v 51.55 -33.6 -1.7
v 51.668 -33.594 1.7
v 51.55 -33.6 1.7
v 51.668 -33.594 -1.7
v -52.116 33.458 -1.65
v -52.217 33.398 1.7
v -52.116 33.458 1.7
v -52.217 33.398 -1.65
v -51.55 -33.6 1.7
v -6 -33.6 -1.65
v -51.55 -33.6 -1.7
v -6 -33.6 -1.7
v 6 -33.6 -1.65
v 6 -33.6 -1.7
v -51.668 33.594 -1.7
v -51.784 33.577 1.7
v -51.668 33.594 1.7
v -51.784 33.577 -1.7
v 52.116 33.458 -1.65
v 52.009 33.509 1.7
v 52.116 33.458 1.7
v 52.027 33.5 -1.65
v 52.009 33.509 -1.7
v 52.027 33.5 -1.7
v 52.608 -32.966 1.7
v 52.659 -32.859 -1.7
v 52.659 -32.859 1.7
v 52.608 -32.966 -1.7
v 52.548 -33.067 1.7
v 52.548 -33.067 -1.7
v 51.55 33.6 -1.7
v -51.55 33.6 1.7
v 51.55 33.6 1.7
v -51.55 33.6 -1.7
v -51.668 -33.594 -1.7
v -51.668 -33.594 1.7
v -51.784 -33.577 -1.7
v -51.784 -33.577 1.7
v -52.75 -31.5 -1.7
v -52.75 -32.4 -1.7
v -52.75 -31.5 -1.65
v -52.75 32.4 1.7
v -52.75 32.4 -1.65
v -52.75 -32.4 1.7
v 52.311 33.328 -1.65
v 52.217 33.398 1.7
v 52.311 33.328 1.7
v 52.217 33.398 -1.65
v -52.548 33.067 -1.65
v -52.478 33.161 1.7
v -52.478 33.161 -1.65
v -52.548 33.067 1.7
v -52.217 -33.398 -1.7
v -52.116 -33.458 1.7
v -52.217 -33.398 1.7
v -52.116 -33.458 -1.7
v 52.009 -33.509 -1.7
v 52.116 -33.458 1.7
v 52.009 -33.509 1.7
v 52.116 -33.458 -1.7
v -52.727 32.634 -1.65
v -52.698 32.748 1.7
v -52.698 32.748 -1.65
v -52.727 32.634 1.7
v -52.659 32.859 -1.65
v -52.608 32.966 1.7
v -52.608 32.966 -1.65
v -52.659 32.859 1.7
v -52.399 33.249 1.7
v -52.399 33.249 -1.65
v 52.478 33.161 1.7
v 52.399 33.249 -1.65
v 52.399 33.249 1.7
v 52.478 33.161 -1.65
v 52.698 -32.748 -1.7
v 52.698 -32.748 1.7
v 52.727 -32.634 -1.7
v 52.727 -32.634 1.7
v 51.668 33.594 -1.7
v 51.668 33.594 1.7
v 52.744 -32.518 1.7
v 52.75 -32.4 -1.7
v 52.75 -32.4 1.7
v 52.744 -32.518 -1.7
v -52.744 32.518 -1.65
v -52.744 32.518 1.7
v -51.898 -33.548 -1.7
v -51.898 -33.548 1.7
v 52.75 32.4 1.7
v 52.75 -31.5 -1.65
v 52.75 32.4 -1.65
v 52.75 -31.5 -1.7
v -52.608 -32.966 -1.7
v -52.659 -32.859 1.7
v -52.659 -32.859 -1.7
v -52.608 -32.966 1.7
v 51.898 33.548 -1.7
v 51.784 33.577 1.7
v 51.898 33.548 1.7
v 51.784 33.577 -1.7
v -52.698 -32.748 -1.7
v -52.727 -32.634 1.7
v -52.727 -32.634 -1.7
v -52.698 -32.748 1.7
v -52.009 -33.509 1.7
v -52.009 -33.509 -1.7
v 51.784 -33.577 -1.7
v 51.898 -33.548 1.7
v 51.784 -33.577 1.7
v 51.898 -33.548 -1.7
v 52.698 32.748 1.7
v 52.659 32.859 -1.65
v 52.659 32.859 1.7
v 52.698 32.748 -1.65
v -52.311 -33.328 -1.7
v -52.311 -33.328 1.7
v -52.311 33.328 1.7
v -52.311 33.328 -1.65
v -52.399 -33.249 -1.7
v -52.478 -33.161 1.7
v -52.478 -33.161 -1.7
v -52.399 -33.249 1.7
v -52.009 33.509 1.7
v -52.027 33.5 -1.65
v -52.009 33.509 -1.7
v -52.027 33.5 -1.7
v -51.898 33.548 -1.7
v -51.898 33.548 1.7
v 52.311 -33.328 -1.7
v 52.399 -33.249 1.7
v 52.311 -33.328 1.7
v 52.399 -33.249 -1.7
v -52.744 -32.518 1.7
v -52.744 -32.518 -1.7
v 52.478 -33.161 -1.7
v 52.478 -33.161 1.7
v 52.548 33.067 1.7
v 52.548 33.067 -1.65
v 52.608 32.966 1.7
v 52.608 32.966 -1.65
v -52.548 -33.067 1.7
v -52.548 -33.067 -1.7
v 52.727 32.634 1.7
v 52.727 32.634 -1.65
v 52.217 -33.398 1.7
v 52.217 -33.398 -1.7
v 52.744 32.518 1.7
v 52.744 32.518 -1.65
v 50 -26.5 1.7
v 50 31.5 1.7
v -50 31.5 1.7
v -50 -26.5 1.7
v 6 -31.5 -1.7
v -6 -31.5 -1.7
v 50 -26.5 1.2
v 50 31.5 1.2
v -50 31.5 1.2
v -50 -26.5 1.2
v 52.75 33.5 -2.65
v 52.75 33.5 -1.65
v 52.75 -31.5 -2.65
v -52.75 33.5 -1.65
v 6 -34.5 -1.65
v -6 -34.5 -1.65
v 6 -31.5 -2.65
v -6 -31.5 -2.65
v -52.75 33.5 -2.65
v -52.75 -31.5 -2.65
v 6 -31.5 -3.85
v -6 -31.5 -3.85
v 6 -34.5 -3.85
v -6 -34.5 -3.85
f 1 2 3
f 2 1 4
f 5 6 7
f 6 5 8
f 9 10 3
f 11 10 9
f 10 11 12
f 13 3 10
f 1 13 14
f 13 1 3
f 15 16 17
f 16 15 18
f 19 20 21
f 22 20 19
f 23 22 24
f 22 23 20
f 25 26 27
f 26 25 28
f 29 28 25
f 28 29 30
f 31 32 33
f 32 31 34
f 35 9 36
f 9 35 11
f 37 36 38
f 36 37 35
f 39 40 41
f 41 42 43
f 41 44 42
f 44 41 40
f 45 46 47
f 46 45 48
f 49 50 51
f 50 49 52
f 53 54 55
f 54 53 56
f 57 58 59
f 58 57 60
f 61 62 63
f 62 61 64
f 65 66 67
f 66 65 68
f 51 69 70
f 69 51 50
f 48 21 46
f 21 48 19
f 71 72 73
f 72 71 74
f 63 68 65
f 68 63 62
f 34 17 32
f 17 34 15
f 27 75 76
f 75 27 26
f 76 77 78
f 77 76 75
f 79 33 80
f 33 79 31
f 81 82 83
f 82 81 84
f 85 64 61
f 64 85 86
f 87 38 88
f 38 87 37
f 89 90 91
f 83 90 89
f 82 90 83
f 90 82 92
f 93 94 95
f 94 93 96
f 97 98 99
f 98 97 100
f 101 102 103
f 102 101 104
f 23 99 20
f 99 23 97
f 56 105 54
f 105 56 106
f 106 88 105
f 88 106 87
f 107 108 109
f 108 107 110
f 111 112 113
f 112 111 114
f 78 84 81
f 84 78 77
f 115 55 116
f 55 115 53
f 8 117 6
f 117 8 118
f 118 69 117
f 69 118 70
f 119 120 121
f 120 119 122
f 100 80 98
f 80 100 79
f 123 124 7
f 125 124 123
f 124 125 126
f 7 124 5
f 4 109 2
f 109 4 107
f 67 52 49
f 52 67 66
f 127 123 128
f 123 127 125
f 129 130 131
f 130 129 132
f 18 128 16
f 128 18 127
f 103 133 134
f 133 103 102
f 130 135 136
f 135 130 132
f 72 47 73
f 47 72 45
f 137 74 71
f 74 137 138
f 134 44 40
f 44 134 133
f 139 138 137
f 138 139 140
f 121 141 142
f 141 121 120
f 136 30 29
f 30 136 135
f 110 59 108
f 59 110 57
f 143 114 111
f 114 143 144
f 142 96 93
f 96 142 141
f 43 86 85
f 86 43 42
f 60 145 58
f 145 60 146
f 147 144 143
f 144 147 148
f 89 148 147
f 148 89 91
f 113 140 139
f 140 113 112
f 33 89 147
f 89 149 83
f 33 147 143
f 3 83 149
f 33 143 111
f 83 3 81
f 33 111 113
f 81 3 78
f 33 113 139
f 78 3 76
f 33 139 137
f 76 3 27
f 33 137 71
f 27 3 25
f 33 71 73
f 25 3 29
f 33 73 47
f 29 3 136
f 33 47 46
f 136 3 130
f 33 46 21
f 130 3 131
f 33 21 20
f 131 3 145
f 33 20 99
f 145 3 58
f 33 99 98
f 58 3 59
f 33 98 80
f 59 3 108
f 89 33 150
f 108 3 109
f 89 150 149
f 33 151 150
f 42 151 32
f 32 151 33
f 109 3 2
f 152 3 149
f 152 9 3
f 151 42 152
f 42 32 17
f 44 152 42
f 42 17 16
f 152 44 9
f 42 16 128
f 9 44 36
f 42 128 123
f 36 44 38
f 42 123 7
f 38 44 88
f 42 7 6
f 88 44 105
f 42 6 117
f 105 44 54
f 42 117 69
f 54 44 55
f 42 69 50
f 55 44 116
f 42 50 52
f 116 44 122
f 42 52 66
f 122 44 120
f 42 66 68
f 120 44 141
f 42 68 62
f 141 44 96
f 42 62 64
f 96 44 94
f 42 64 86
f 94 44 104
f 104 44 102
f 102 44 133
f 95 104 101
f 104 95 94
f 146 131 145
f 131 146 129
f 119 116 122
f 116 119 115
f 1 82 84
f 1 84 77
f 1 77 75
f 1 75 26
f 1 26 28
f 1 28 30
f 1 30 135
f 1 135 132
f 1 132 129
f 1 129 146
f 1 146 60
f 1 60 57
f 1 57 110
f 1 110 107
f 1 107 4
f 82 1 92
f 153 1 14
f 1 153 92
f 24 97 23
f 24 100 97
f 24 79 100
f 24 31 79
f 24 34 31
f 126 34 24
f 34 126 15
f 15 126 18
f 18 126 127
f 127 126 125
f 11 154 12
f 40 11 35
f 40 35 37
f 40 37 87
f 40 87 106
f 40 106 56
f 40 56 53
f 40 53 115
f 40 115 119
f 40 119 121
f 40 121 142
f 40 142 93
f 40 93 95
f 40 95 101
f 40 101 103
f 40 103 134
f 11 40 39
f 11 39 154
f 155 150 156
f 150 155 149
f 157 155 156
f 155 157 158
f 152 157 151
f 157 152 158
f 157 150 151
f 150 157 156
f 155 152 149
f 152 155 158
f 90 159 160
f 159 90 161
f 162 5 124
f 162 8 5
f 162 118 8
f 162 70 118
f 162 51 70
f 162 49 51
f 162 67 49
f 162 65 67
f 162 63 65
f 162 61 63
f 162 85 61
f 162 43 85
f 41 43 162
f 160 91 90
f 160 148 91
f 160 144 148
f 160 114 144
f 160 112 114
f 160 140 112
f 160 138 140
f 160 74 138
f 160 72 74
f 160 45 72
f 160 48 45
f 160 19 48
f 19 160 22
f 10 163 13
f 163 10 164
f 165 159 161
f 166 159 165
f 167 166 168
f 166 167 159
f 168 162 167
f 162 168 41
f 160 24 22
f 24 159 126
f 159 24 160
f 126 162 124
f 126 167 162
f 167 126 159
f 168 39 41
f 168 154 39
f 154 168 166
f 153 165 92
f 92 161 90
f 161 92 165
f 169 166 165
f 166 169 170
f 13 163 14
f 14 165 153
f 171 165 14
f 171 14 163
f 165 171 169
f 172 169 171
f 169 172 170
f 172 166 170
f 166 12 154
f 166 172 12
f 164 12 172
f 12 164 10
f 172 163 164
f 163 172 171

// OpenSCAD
$fn = 64;

// ===== Parameters (from request) =====
overall_width     = 105.5;
overall_height    = 67.2;
overall_thickness = 3.4;

// Front window / bezel opening (requested [[-50,-26.5],[50,31.5,0.5]])
aperture_min_x     = -50;
aperture_min_y     = -26.5;
aperture_max_x     =  50;
aperture_max_y     =  31.5;
aperture_cut_depth = 0.5;

// Back step region (requested [[-105.5/2, -65/2+1],[105.5/2, 65/2+1, 1]])
back_step_min_x   = -overall_width/2;
back_step_min_y   = -65/2 + 1;
back_step_max_x   =  overall_width/2;
back_step_max_y   =  65/2 + 1;
back_step_depth   = 1;

// Bottom connector/feature (requested [[0,-34.5],[12,-31.5]])
conn_center_x     = 0;
conn_min_y        = -34.5;
conn_max_y        = -31.5;
conn_width_x      = 12;

// ===== Modeling controls =====
eps     = 0.05;   // overlap to guarantee manifold unions/differences
bezel_r = 1.2;    // corner rounding

// ===== Helpers =====
module rounded_plate_xy(size=[10,10,1], r=1, center=true) {
    w = size[0]; h = size[1]; t = size[2];
    translate(center ? [0,0,-t/2] : [0,0,0])
        linear_extrude(height=t, convexity=10)
            offset(r=r)
                square([max(0.01, w-2*r), max(0.01, h-2*r)], center=true);
}

// ===== One connected solid display module =====
module display_module() {
    // Derived sizes
    aperture_w  = aperture_max_x - aperture_min_x;
    aperture_h  = aperture_max_y - aperture_min_y;
    aperture_cx = (aperture_min_x + aperture_max_x)/2;
    aperture_cy = (aperture_min_y + aperture_max_y)/2;

    step_w  = back_step_max_x - back_step_min_x;
    step_h  = back_step_max_y - back_step_min_y;
    step_cx = (back_step_min_x + back_step_max_x)/2;
    step_cy = (back_step_min_y + back_step_max_y)/2;

    conn_h_y = conn_max_y - conn_min_y;
    conn_cy  = (conn_min_y + conn_max_y)/2;

    // Make connector thickness tied to known dimensions (visible, but not arbitrary)
    conn_thickness = min(2.2, overall_thickness); // keep plausible and connected

    // Z references
    z_front =  overall_thickness/2;
    z_back  = -overall_thickness/2;

    union() {
        // Base with front recess cut
        difference() {
            rounded_plate_xy([overall_width, overall_height, overall_thickness], r=bezel_r, center=true);

            // Cut from the FRONT face inward by aperture_cut_depth
            translate([aperture_cx, aperture_cy, z_front - (aperture_cut_depth/2) + eps/2])
                cube([aperture_w, aperture_h, aperture_cut_depth + eps], center=true);
        }

        // Back step pad (protrudes from back face by back_step_depth)
        translate([step_cx, step_cy, z_back - back_step_depth/2 + eps])
            cube([step_w, step_h, back_step_depth], center=true);

        // Bottom connector/feature (protrudes from back; guaranteed to intersect base/step)
        translate([conn_center_x, conn_cy, z_back - conn_thickness/2 + eps])
            cube([conn_width_x, conn_h_y, conn_thickness], center=true);
    }
}

display_module();
